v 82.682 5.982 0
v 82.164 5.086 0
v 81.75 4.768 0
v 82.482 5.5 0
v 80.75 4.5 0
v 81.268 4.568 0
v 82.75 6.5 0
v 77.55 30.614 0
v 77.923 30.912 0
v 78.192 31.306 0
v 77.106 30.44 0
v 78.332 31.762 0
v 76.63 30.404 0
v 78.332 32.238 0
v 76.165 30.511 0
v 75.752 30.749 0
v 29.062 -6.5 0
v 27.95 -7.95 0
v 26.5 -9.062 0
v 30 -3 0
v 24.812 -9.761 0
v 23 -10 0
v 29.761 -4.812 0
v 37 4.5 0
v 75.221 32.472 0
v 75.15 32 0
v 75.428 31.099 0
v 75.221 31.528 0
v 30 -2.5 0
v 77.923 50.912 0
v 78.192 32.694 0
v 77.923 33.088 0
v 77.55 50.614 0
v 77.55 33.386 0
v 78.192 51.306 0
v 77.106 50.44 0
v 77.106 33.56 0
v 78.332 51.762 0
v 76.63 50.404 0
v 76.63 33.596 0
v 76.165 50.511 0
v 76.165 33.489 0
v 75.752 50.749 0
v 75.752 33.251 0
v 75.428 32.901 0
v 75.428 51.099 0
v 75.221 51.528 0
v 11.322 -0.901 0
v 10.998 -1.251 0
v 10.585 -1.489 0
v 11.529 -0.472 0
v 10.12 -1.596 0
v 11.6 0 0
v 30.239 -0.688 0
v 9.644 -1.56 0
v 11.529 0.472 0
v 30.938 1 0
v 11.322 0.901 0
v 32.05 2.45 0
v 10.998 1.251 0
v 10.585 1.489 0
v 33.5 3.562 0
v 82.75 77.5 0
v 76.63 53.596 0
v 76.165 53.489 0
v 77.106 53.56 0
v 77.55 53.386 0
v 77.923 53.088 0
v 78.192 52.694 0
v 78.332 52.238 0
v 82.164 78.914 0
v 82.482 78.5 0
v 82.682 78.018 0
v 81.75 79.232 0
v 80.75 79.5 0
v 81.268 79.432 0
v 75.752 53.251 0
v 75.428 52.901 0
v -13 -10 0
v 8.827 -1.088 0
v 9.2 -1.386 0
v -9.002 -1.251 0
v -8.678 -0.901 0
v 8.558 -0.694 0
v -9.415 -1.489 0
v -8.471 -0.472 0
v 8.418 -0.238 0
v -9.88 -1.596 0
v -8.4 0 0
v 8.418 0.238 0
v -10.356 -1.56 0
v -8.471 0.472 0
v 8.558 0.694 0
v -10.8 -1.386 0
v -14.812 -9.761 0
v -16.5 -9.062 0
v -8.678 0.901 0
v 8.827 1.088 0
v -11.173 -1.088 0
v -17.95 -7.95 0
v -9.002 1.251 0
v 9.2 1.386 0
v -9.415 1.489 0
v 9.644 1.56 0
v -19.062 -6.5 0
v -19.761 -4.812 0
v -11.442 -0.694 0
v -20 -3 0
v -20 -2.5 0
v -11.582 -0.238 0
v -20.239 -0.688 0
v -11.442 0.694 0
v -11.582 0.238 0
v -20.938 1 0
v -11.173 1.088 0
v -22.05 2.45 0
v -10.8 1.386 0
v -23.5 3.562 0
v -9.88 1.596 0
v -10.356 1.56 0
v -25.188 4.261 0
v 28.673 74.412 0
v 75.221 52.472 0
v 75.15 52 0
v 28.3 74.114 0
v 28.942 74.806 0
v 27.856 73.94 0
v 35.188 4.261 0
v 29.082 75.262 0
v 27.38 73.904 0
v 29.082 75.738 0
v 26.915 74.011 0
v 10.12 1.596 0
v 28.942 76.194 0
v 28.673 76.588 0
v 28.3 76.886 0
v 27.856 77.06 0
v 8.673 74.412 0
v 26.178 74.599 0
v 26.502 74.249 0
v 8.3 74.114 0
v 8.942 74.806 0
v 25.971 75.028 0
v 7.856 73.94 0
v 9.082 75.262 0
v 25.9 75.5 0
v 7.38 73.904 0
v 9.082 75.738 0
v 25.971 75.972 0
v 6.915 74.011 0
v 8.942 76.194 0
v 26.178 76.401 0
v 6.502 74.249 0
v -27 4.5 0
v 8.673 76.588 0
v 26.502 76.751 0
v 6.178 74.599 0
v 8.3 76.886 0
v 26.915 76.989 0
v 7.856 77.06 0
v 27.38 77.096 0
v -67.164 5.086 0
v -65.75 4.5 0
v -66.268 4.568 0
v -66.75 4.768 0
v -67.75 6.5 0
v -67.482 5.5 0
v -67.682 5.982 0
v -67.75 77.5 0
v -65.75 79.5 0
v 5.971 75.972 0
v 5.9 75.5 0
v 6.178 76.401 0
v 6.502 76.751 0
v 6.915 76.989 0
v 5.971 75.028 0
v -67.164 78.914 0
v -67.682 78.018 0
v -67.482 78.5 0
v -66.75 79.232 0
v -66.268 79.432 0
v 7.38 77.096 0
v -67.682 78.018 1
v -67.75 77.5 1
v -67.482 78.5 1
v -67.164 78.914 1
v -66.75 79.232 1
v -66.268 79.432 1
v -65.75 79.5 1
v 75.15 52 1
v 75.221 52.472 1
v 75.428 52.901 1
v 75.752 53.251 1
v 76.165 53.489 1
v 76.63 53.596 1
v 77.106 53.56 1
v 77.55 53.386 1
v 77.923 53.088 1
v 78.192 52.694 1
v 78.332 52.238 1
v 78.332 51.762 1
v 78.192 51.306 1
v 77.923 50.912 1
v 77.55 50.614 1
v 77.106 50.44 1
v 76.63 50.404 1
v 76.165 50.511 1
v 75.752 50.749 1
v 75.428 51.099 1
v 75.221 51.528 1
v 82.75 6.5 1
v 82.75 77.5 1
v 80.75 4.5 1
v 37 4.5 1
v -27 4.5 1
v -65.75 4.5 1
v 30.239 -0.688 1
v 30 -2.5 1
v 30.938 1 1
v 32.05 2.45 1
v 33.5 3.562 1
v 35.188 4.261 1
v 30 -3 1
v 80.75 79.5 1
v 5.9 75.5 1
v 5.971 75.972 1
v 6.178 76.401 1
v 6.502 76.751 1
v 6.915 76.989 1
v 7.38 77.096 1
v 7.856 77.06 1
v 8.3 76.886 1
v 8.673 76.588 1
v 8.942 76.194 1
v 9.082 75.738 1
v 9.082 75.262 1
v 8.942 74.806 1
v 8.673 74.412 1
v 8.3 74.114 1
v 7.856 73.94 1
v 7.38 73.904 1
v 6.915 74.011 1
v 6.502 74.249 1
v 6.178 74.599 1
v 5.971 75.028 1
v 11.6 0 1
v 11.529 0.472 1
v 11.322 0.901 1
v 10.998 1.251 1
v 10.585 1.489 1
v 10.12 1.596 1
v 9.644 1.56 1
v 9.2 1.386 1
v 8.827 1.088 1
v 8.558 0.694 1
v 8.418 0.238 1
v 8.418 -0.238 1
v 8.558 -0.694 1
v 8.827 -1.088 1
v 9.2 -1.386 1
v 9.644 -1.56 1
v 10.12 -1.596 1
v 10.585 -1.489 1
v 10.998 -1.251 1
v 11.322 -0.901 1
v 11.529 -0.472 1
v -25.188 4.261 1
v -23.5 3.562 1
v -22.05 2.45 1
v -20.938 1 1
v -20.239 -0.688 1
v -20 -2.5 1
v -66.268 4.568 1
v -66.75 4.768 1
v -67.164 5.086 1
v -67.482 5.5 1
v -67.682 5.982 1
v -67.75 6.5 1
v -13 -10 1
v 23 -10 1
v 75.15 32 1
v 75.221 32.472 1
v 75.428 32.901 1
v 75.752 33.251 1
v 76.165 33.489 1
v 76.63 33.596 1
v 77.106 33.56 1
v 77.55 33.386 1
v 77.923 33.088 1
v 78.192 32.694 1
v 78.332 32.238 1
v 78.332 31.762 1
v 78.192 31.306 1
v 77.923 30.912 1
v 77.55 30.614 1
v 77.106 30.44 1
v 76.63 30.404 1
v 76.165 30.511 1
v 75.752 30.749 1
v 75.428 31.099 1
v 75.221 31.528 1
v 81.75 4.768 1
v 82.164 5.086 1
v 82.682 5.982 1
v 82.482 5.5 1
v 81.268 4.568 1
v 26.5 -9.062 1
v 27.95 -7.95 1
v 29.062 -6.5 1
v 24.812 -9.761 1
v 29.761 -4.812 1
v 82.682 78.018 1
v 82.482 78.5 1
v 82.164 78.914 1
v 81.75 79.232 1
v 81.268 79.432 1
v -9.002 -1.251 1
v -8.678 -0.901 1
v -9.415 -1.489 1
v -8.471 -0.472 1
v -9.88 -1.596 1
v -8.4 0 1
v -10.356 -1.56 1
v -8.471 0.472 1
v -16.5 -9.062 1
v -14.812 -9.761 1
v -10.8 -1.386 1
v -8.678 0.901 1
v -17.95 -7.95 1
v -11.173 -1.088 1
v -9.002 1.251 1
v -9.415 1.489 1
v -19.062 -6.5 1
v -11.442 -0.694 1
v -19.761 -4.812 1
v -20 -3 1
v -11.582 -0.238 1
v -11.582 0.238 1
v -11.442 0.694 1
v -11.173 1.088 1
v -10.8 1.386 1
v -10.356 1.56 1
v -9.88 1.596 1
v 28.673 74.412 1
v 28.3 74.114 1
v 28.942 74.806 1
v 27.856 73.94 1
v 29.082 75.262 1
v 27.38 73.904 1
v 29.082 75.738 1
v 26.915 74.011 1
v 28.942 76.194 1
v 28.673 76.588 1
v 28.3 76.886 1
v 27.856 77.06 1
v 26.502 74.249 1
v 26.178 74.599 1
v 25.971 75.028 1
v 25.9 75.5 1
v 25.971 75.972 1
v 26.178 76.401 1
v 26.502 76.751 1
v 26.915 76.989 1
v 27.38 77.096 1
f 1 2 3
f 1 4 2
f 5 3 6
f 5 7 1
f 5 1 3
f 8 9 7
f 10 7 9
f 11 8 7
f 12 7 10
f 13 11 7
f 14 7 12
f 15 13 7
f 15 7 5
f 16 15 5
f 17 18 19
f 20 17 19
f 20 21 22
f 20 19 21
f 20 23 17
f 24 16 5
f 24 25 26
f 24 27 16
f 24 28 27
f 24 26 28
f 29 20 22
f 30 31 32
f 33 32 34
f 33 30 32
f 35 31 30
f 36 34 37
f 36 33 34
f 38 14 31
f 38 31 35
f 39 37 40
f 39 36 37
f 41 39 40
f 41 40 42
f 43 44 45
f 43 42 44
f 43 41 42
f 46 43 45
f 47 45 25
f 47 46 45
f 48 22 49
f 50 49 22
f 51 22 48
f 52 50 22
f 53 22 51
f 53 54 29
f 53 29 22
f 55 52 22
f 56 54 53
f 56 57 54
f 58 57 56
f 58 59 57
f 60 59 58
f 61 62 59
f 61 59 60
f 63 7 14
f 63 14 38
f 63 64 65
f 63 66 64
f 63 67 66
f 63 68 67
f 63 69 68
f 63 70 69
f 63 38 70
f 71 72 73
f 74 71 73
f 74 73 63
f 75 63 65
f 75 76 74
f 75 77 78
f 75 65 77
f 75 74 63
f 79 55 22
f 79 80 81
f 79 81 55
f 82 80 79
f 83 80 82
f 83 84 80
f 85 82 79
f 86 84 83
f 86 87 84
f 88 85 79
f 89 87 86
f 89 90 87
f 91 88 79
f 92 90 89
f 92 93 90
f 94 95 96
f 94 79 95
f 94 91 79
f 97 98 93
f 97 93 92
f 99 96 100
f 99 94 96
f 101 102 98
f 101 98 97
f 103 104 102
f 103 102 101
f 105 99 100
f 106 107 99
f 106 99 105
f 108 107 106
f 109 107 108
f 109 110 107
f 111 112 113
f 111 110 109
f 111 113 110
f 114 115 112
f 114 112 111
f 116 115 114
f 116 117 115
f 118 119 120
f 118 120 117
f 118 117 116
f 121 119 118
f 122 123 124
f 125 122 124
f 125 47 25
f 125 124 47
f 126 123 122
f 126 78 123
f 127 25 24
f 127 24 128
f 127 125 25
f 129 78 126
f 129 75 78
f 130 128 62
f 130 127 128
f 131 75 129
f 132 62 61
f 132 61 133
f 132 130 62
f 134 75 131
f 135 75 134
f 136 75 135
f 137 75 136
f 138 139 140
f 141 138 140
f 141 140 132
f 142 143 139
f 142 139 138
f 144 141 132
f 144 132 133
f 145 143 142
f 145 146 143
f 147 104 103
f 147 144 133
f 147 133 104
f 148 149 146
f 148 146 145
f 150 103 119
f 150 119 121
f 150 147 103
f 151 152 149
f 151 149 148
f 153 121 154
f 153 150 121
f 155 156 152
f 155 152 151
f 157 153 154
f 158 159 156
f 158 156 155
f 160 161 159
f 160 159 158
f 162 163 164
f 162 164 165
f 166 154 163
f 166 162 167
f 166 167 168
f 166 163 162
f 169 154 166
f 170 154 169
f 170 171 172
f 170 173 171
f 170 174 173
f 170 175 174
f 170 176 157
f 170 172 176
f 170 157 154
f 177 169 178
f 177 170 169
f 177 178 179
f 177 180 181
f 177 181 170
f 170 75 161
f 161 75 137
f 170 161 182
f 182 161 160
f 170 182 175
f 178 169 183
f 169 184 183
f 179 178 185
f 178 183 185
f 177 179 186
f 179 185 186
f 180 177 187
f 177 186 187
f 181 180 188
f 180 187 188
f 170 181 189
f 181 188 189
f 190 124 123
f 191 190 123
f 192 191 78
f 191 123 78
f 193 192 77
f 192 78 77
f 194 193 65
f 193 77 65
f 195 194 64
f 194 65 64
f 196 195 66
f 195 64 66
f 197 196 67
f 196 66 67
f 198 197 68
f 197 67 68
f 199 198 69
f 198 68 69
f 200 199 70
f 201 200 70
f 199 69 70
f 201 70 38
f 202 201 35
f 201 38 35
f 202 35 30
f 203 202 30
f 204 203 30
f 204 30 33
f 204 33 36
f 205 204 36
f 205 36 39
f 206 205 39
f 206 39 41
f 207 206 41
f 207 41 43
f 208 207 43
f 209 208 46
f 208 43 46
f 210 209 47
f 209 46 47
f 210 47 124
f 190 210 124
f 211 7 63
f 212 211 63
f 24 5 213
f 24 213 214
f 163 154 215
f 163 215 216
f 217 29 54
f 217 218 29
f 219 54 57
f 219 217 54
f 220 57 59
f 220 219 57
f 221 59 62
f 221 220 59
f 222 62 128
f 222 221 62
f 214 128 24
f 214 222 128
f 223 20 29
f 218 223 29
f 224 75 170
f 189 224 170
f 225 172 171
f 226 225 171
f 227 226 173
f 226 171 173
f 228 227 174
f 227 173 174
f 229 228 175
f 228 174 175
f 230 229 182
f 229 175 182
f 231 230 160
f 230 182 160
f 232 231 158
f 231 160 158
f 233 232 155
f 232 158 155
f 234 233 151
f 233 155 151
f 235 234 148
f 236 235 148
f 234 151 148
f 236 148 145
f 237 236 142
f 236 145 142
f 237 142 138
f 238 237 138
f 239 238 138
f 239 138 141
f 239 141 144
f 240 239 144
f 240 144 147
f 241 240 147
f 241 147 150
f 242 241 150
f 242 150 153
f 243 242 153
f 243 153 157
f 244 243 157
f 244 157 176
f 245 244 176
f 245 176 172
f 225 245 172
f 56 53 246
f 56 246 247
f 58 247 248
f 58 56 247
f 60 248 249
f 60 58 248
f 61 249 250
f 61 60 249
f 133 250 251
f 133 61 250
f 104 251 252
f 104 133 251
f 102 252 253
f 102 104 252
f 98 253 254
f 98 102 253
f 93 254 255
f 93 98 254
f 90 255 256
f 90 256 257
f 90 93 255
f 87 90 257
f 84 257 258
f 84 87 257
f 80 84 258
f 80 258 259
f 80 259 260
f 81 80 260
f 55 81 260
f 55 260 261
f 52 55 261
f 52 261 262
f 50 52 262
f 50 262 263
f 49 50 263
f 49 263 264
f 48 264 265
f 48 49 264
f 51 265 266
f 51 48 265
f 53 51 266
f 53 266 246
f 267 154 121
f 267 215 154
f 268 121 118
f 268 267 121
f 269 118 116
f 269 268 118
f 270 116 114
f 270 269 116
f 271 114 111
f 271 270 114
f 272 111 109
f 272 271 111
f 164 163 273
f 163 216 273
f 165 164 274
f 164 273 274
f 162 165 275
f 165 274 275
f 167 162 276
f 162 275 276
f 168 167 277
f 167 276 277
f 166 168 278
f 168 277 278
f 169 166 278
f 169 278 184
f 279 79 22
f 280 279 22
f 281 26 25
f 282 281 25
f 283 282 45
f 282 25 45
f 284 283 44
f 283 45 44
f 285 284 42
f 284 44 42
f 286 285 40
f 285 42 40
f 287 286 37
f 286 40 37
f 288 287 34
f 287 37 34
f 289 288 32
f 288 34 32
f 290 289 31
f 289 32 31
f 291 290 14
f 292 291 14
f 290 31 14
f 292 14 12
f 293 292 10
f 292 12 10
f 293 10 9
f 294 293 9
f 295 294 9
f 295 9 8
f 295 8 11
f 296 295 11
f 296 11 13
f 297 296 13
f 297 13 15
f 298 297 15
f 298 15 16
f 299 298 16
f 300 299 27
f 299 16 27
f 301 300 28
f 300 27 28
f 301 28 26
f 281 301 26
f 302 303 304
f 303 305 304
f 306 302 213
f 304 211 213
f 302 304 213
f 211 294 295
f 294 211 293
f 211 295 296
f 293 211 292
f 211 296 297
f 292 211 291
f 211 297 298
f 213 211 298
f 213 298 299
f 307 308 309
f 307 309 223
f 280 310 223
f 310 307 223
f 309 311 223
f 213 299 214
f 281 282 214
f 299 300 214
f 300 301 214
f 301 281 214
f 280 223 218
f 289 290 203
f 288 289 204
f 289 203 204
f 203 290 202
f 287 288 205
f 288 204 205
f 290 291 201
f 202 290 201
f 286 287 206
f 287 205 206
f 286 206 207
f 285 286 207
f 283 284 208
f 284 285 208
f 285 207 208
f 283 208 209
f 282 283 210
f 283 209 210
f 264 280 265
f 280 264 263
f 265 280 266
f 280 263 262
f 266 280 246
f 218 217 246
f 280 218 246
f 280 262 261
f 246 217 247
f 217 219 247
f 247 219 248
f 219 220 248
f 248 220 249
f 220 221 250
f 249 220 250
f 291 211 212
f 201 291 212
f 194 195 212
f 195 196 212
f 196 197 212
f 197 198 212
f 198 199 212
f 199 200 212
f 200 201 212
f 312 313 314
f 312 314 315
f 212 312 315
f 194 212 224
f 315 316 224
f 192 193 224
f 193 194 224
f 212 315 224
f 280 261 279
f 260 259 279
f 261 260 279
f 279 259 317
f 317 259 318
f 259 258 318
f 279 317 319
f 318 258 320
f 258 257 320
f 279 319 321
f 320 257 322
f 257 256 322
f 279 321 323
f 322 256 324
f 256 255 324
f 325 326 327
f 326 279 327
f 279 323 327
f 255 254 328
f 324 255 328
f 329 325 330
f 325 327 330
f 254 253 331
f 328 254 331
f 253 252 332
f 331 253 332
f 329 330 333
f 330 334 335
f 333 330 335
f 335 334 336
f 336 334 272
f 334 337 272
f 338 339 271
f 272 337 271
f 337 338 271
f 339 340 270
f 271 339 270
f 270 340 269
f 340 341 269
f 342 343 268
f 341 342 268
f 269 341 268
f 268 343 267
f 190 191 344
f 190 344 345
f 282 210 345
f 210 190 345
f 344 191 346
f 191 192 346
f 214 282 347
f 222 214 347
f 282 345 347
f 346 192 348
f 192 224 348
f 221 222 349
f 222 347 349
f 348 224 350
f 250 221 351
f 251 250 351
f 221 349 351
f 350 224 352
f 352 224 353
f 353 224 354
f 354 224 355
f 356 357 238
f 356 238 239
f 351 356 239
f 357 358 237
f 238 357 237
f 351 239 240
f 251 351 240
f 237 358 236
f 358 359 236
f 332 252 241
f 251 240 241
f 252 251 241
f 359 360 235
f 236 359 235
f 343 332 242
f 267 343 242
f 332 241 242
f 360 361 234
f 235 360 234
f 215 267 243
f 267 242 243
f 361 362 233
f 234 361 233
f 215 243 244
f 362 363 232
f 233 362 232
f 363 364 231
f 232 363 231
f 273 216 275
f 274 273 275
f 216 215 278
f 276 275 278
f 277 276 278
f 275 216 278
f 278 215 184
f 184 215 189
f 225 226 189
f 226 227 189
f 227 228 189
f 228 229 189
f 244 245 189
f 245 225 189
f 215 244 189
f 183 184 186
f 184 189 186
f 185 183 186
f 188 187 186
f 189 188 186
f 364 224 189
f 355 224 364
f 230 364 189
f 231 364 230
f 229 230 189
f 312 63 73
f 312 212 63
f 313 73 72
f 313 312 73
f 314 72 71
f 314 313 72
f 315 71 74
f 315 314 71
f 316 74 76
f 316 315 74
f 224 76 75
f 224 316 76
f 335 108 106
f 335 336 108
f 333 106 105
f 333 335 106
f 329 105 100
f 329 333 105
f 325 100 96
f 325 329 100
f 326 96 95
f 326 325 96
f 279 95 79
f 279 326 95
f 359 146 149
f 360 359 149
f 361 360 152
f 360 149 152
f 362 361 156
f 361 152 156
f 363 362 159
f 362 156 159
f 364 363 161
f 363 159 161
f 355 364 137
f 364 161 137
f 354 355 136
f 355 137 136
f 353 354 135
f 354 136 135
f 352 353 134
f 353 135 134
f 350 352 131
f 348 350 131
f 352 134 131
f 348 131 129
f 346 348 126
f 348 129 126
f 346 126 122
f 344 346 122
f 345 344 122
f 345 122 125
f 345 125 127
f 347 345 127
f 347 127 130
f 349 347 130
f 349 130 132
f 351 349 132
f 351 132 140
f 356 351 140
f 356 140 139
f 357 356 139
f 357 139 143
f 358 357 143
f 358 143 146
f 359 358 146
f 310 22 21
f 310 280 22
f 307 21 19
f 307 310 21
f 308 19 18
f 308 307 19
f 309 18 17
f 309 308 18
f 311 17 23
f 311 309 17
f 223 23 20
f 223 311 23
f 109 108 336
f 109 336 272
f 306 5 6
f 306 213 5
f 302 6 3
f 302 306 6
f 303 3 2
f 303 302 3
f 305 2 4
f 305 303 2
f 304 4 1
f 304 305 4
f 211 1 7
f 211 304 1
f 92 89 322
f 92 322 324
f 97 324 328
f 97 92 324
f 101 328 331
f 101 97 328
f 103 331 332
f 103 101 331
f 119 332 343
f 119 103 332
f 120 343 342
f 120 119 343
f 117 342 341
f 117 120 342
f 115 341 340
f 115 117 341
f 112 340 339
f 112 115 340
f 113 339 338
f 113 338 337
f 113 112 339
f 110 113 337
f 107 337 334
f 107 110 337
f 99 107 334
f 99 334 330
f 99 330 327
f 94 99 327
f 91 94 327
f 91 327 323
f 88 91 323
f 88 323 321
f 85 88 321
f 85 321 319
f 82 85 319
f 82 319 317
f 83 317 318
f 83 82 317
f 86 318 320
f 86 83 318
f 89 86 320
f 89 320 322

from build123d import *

# Parameters (mm, degrees)
SKETCH_1_W          = 60
SKETCH_1_H          = 14.5
SKETCH_1_R          = 1.6
EXTRUDE_1_DEPTH     = 1
SKETCH_2_W          = 120.5
SKETCH_2_H          = 75
SKETCH_2_R          = 1.6
EXTRUDE_2_DEPTH     = 1
SKETCH_3_R          = 1.6
CUT_EXTRUDE_1_DEPTH = 10
SKETCH_4_W          = 30
SKETCH_4_H          = 75
EXTRUDE_3_DEPTH     = 1
FILLET_1_R          = 7
SKETCH_5_W          = 10
SKETCH_5_H          = 14.5
CUT_EXTRUDE_2_DEPTH = 10
FILLET_2_R          = 7
FILLET_3_R          = 2


with BuildPart() as part:
    # 草图1 → 凸台-拉伸1 (new body)
    with BuildSketch(Plane.XY):
        with Locations((0, -2.75)):
            Rectangle(SKETCH_1_W, SKETCH_1_H)
        with Locations((-10, 0)):
            Circle(SKETCH_1_R, mode=Mode.SUBTRACT)
        with Locations((10, 0)):
            Circle(SKETCH_1_R, mode=Mode.SUBTRACT)
    extrude(amount=EXTRUDE_1_DEPTH)

    # 草图2 → 凸台-拉伸2 (add)
    with BuildSketch(Plane(origin=(0, 0, 0), x_dir=(-1, 0, 0), z_dir=(0, 0, -1))):
        with Locations((-22.5, 42)):
            Rectangle(SKETCH_2_W, SKETCH_2_H)
        with Locations((-76.75, 52)):
            Circle(SKETCH_2_R, mode=Mode.SUBTRACT)
        with Locations((-76.75, 32)):
            Circle(SKETCH_2_R, mode=Mode.SUBTRACT)
    extrude(amount=-EXTRUDE_2_DEPTH)

    # 草图3 → 切除-拉伸1 (cut)
    with BuildSketch(Plane(origin=(0, 0, 0), x_dir=(-1, 0, 0), z_dir=(0, 0, -1))):
        with Locations((-27.5, 75.5)):
            Circle(SKETCH_3_R)
        with Locations((-7.5, 75.5)):
            Circle(SKETCH_3_R)
    extrude(amount=-CUT_EXTRUDE_1_DEPTH, mode=Mode.SUBTRACT)

    # 草图4 → 凸台-拉伸3 (add)
    with BuildSketch(Plane(origin=(0, 0, 0), x_dir=(-1, 0, 0), z_dir=(0, 0, -1))):
        with Locations((52.75, 42)):
            Rectangle(SKETCH_4_W, SKETCH_4_H)
    extrude(amount=-EXTRUDE_3_DEPTH)

    # 圆角1
    fillet_1_edges = [part.edges().sort_by_distance(p)[0] for p in [
        (30, -10, 0.5),
        (30, 4.5, 0.5),
    ]]
    fillet(fillet_1_edges, radius=FILLET_1_R)

    # 草图5 → 切除-拉伸2 (cut)
    with BuildSketch(Plane(origin=(0, 0, 0), x_dir=(-1, 0, 0), z_dir=(0, 0, -1))):
        with Locations((25, -2.75)):
            Rectangle(SKETCH_5_W, SKETCH_5_H)
    extrude(amount=-CUT_EXTRUDE_2_DEPTH, mode=Mode.SUBTRACT)

    # 圆角2
    fillet_2_edges = [part.edges().sort_by_distance(p)[0] for p in [
        (-20, -10, 0.5),
        (-20, 4.5, 0.5),
    ]]
    fillet(fillet_2_edges, radius=FILLET_2_R)

    # 圆角3
    fillet_3_edges = [part.edges().sort_by_distance(p)[0] for p in [
        (82.75, 4.5, 0.5),
        (82.75, 79.5, 0.5),
        (-67.75, 79.5, 0.5),
        (-67.75, 4.5, 0.5),
    ]]
    fillet(fillet_3_edges, radius=FILLET_3_R)


solid = part.part
